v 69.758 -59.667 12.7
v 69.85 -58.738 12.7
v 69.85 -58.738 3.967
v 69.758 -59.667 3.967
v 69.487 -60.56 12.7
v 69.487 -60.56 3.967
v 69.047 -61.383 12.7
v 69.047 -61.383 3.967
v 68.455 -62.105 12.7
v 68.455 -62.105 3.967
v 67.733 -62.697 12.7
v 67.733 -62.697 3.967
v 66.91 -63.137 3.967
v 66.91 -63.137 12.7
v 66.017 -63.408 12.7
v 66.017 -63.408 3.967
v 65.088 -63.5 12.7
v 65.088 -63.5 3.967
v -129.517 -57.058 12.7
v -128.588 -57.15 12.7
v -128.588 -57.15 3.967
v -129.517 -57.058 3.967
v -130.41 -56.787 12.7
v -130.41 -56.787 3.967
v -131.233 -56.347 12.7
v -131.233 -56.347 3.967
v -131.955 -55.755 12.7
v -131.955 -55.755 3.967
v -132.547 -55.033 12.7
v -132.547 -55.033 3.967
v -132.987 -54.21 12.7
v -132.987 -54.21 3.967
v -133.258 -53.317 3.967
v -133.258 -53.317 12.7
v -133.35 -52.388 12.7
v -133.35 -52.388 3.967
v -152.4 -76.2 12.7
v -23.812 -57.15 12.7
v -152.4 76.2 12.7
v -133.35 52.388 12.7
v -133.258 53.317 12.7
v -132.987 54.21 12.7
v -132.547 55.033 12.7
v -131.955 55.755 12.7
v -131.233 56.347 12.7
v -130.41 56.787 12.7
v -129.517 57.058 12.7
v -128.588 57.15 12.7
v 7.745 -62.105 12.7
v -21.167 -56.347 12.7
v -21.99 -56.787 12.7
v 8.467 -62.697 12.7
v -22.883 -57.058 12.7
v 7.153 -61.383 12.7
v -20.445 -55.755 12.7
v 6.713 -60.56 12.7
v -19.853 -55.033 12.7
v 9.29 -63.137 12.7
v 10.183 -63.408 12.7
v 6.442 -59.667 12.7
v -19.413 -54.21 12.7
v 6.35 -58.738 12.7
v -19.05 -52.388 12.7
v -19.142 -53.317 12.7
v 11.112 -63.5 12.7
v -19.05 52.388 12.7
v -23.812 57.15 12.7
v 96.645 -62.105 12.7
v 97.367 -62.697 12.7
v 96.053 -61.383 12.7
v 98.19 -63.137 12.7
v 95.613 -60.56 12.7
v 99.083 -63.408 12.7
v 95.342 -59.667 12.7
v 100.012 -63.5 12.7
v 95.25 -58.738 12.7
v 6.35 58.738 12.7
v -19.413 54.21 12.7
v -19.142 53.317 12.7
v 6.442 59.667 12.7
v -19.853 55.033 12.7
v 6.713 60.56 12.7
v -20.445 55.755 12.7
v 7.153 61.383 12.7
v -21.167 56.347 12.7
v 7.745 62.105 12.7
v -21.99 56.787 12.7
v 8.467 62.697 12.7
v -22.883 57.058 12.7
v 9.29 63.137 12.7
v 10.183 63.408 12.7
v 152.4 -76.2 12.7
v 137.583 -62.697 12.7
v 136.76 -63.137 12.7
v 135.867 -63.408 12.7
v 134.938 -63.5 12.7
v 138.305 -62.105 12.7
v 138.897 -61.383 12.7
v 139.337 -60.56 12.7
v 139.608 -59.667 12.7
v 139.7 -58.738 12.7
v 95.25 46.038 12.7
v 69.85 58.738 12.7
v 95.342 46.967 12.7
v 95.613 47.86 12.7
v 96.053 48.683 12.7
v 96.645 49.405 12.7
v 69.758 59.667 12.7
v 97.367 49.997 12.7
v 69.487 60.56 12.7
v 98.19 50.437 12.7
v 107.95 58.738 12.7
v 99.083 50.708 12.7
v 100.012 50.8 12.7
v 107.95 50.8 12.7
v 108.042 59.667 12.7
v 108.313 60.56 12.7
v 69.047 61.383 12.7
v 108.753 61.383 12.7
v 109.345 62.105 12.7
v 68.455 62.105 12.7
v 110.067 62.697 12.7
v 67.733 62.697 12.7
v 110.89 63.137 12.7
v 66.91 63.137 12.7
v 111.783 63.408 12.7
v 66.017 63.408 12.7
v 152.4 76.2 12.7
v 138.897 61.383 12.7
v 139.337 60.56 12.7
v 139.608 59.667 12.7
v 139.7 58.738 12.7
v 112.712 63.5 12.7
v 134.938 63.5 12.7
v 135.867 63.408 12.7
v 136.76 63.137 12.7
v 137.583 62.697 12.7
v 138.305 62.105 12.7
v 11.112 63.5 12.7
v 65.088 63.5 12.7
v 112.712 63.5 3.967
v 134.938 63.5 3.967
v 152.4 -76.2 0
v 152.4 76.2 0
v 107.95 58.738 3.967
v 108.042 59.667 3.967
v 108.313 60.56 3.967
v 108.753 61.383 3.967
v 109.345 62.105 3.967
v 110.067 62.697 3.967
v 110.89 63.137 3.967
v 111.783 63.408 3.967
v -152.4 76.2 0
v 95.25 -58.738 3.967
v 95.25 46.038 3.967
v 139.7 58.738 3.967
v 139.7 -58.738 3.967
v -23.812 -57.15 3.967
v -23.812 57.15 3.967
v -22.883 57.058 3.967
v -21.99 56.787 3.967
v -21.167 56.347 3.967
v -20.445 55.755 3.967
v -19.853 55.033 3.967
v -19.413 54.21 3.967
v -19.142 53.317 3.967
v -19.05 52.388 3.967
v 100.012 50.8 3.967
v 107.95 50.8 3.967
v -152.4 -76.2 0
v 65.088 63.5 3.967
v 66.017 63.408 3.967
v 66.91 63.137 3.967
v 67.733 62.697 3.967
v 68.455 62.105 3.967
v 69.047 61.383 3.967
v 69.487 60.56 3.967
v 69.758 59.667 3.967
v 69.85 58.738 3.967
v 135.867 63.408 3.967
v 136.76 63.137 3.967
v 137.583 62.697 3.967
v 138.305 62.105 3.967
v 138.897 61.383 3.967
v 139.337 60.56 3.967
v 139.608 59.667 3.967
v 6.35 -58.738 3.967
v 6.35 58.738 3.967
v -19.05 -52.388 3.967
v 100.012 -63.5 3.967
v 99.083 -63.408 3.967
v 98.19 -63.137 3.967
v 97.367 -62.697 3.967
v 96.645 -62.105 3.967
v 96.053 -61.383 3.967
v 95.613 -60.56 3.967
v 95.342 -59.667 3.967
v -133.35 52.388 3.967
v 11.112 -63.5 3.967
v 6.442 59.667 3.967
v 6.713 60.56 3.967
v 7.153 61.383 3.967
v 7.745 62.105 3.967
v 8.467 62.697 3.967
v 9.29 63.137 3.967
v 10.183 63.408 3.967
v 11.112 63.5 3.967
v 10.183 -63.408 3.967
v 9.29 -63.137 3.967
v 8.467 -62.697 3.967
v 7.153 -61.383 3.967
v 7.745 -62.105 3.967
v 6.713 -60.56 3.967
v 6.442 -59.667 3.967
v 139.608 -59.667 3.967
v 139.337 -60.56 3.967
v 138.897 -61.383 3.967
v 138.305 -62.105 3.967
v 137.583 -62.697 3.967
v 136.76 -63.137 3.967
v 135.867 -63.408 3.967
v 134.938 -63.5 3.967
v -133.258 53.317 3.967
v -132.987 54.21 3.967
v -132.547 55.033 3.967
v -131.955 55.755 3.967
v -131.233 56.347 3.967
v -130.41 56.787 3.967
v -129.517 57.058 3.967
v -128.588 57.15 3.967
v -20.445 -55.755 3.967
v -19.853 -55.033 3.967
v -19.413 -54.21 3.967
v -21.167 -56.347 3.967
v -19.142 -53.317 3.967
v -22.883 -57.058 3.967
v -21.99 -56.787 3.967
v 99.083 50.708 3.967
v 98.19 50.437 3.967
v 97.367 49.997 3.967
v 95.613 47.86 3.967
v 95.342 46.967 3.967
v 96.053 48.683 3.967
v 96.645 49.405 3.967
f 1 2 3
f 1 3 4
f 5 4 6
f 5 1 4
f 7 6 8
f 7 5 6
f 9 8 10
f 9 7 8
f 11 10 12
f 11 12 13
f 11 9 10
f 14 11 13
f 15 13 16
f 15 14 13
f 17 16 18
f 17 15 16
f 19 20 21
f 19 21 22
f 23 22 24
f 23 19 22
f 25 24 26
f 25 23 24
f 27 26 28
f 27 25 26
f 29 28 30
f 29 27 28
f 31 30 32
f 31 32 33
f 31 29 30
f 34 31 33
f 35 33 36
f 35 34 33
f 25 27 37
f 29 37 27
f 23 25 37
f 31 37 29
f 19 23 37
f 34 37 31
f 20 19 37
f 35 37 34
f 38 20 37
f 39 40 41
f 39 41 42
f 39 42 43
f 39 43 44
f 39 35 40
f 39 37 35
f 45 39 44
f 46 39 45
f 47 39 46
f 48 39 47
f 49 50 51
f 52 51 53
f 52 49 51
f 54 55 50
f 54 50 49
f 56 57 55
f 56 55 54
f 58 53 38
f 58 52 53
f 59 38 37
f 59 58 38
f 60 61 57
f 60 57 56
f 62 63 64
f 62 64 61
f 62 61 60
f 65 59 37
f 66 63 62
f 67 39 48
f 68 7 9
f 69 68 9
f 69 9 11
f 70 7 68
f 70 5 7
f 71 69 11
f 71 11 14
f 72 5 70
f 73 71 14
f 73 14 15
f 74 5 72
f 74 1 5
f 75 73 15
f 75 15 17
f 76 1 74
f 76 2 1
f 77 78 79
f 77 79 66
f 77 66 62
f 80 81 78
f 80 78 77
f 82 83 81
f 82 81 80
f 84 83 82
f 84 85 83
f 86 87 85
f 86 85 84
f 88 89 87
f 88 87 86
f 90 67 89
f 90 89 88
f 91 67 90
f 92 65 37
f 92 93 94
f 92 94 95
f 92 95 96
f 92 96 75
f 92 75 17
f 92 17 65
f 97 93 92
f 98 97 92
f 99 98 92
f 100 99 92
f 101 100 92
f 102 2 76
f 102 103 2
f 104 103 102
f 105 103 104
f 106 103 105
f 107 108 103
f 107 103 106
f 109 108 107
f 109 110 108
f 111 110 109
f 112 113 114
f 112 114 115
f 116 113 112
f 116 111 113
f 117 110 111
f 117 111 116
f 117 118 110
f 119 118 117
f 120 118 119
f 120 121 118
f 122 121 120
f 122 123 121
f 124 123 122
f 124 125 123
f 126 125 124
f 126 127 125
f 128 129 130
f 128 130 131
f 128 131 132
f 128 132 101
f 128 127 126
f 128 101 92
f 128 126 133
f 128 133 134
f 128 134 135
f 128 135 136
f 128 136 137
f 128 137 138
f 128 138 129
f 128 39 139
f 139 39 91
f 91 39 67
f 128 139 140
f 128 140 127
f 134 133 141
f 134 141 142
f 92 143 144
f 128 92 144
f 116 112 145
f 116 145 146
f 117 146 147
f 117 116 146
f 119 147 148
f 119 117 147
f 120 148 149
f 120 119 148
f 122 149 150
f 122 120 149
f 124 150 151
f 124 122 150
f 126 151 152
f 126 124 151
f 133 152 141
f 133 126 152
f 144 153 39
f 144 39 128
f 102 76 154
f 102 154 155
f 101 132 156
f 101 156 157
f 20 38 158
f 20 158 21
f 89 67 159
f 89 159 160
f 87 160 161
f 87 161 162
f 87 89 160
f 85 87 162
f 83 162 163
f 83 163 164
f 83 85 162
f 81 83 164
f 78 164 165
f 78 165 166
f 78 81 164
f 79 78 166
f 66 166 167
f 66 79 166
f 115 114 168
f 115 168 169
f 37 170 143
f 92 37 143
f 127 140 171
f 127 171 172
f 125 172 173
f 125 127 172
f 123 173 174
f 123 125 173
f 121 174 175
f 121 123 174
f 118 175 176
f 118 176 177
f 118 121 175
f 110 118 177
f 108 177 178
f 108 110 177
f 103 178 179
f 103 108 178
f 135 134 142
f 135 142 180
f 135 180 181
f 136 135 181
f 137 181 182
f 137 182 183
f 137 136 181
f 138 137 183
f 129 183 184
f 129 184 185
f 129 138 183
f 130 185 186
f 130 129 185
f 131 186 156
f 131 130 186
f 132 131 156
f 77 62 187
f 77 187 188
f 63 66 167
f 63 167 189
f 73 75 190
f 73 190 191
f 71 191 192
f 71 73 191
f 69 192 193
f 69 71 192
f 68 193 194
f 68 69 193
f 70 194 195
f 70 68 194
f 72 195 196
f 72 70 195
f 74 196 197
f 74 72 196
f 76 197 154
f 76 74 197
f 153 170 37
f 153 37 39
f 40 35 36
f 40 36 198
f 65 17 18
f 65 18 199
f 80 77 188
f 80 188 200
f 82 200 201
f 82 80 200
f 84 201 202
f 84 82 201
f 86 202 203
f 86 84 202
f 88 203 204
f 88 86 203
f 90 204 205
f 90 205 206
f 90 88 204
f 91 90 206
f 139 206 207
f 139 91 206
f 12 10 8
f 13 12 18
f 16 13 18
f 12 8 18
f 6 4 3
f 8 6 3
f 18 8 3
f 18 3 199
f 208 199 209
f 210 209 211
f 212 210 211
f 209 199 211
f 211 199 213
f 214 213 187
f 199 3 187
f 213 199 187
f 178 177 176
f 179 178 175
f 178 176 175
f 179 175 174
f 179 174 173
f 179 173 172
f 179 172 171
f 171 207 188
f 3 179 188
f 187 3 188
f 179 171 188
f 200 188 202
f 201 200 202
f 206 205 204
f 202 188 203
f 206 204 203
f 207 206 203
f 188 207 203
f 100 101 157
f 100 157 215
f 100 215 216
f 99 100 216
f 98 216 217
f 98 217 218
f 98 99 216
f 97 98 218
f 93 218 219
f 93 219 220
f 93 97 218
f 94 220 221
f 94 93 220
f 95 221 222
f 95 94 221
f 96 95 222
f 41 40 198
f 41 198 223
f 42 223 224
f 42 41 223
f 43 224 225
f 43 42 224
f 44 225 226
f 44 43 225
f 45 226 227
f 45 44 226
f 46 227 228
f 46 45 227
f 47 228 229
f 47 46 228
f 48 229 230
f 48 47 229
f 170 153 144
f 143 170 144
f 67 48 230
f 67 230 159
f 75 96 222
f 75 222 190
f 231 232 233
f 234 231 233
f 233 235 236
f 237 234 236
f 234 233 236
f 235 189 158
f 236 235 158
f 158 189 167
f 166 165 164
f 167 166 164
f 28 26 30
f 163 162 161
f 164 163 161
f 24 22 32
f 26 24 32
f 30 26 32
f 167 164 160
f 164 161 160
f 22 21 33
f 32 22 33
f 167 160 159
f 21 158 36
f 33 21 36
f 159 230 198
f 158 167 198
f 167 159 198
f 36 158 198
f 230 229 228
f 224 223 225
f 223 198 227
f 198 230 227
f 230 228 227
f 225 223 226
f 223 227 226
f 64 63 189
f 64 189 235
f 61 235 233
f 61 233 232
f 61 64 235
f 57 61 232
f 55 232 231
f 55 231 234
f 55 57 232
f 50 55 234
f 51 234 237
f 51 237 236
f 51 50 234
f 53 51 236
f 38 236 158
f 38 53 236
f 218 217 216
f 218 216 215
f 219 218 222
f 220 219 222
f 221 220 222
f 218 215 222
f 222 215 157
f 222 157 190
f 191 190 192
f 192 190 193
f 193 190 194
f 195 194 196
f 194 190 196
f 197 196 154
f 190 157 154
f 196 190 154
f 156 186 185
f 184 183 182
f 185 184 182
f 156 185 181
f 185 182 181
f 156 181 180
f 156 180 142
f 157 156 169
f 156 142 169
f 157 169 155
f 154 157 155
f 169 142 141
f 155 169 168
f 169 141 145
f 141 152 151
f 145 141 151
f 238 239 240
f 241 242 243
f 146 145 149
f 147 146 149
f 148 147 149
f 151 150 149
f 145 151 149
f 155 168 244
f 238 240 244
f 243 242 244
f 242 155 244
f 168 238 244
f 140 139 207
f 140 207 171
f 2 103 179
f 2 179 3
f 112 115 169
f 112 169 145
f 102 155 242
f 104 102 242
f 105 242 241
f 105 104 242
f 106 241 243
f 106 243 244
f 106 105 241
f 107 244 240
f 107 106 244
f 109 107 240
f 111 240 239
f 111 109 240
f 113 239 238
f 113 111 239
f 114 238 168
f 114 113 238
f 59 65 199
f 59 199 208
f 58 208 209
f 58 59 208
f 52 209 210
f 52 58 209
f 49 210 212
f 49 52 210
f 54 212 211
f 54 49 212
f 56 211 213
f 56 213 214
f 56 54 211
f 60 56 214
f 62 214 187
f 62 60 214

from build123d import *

# Parameters (mm, degrees)
SKETCH1_W           = 304.8
SKETCH1_H           = 152.4
BOSS_EXTRUDE1_DEPTH = 12.7
CUT_EXTRUDE1_DEPTH  = 8.73252
CUT_EXTRUDE2_DEPTH  = 8.73252


with BuildPart() as part:
    # Sketch1 → Boss-Extrude1 (new body)
    with BuildSketch(Plane.XY):
        Rectangle(SKETCH1_W, SKETCH1_H)
    extrude(amount=BOSS_EXTRUDE1_DEPTH)

    # Sketch2 → Cut-Extrude1 (cut)
    with BuildSketch(Plane.XY.offset(12.7)):
        with BuildLine():
            Line((-128.5875, 57.15), (-23.8125, 57.15))
            ThreePointArc((-23.8125, 57.15), (-20.444903955, 55.755096045), (-19.05, 52.3875))
            Line((-19.05, 52.3875), (-19.05, -52.3875))
            ThreePointArc((-19.05, -52.3875), (-20.444903955, -55.755096045), (-23.8125, -57.15))
            Line((-23.8125, -57.15), (-128.5875, -57.15))
            ThreePointArc((-128.5875, -57.15), (-131.955096045, -55.755096045), (-133.35, -52.3875))
            Line((-133.35, -52.3875), (-133.35, 52.3875))
            ThreePointArc((-133.35, 52.3875), (-131.955096045, 55.755096045), (-128.5875, 57.15))
        make_face()
    extrude(amount=-CUT_EXTRUDE1_DEPTH, mode=Mode.SUBTRACT)

    # Sketch3 → Cut-Extrude2 (cut)
    with BuildSketch(Plane.XY.offset(12.7)):
        with BuildLine():
            Line((100.0125, 50.8), (107.95, 50.8))
            Line((107.95, 50.8), (107.95, 58.7375))
            ThreePointArc((107.95, 58.7375), (109.344903955, 62.105096045), (112.7125, 63.5))
            Line((112.7125, 63.5), (134.9375, 63.5))
            ThreePointArc((134.9375, 63.5), (138.305096045, 62.105096045), (139.7, 58.7375))
            Line((139.7, 58.7375), (139.7, 50.8))
            Line((139.7, 50.8), (139.7, -58.7375))
            ThreePointArc((139.7, -58.7375), (138.305096045, -62.105096045), (134.9375, -63.5))
            Line((134.9375, -63.5), (100.0125, -63.5))
            ThreePointArc((100.0125, -63.5), (96.644903955, -62.105096045), (95.25, -58.7375))
            Line((95.25, -58.7375), (95.25, 46.0375))
            ThreePointArc((95.25, 46.0375), (96.644903955, 49.405096045), (100.0125, 50.8))
        make_face()
        with BuildLine():
            Line((11.1125, 63.5), (65.0875, 63.5))
            ThreePointArc((65.0875, 63.5), (68.455096045, 62.105096045), (69.85, 58.7375))
            Line((69.85, 58.7375), (69.85, -58.7375))
            ThreePointArc((69.85, -58.7375), (68.455096045, -62.105096045), (65.0875, -63.5))
            Line((65.0875, -63.5), (11.1125, -63.5))
            ThreePointArc((11.1125, -63.5), (7.744903955, -62.105096045), (6.35, -58.7375))
            Line((6.35, -58.7375), (6.35, 58.7375))
            ThreePointArc((6.35, 58.7375), (7.744903955, 62.105096045), (11.1125, 63.5))
        make_face()
    extrude(amount=-CUT_EXTRUDE2_DEPTH, mode=Mode.SUBTRACT)


solid = part.part
